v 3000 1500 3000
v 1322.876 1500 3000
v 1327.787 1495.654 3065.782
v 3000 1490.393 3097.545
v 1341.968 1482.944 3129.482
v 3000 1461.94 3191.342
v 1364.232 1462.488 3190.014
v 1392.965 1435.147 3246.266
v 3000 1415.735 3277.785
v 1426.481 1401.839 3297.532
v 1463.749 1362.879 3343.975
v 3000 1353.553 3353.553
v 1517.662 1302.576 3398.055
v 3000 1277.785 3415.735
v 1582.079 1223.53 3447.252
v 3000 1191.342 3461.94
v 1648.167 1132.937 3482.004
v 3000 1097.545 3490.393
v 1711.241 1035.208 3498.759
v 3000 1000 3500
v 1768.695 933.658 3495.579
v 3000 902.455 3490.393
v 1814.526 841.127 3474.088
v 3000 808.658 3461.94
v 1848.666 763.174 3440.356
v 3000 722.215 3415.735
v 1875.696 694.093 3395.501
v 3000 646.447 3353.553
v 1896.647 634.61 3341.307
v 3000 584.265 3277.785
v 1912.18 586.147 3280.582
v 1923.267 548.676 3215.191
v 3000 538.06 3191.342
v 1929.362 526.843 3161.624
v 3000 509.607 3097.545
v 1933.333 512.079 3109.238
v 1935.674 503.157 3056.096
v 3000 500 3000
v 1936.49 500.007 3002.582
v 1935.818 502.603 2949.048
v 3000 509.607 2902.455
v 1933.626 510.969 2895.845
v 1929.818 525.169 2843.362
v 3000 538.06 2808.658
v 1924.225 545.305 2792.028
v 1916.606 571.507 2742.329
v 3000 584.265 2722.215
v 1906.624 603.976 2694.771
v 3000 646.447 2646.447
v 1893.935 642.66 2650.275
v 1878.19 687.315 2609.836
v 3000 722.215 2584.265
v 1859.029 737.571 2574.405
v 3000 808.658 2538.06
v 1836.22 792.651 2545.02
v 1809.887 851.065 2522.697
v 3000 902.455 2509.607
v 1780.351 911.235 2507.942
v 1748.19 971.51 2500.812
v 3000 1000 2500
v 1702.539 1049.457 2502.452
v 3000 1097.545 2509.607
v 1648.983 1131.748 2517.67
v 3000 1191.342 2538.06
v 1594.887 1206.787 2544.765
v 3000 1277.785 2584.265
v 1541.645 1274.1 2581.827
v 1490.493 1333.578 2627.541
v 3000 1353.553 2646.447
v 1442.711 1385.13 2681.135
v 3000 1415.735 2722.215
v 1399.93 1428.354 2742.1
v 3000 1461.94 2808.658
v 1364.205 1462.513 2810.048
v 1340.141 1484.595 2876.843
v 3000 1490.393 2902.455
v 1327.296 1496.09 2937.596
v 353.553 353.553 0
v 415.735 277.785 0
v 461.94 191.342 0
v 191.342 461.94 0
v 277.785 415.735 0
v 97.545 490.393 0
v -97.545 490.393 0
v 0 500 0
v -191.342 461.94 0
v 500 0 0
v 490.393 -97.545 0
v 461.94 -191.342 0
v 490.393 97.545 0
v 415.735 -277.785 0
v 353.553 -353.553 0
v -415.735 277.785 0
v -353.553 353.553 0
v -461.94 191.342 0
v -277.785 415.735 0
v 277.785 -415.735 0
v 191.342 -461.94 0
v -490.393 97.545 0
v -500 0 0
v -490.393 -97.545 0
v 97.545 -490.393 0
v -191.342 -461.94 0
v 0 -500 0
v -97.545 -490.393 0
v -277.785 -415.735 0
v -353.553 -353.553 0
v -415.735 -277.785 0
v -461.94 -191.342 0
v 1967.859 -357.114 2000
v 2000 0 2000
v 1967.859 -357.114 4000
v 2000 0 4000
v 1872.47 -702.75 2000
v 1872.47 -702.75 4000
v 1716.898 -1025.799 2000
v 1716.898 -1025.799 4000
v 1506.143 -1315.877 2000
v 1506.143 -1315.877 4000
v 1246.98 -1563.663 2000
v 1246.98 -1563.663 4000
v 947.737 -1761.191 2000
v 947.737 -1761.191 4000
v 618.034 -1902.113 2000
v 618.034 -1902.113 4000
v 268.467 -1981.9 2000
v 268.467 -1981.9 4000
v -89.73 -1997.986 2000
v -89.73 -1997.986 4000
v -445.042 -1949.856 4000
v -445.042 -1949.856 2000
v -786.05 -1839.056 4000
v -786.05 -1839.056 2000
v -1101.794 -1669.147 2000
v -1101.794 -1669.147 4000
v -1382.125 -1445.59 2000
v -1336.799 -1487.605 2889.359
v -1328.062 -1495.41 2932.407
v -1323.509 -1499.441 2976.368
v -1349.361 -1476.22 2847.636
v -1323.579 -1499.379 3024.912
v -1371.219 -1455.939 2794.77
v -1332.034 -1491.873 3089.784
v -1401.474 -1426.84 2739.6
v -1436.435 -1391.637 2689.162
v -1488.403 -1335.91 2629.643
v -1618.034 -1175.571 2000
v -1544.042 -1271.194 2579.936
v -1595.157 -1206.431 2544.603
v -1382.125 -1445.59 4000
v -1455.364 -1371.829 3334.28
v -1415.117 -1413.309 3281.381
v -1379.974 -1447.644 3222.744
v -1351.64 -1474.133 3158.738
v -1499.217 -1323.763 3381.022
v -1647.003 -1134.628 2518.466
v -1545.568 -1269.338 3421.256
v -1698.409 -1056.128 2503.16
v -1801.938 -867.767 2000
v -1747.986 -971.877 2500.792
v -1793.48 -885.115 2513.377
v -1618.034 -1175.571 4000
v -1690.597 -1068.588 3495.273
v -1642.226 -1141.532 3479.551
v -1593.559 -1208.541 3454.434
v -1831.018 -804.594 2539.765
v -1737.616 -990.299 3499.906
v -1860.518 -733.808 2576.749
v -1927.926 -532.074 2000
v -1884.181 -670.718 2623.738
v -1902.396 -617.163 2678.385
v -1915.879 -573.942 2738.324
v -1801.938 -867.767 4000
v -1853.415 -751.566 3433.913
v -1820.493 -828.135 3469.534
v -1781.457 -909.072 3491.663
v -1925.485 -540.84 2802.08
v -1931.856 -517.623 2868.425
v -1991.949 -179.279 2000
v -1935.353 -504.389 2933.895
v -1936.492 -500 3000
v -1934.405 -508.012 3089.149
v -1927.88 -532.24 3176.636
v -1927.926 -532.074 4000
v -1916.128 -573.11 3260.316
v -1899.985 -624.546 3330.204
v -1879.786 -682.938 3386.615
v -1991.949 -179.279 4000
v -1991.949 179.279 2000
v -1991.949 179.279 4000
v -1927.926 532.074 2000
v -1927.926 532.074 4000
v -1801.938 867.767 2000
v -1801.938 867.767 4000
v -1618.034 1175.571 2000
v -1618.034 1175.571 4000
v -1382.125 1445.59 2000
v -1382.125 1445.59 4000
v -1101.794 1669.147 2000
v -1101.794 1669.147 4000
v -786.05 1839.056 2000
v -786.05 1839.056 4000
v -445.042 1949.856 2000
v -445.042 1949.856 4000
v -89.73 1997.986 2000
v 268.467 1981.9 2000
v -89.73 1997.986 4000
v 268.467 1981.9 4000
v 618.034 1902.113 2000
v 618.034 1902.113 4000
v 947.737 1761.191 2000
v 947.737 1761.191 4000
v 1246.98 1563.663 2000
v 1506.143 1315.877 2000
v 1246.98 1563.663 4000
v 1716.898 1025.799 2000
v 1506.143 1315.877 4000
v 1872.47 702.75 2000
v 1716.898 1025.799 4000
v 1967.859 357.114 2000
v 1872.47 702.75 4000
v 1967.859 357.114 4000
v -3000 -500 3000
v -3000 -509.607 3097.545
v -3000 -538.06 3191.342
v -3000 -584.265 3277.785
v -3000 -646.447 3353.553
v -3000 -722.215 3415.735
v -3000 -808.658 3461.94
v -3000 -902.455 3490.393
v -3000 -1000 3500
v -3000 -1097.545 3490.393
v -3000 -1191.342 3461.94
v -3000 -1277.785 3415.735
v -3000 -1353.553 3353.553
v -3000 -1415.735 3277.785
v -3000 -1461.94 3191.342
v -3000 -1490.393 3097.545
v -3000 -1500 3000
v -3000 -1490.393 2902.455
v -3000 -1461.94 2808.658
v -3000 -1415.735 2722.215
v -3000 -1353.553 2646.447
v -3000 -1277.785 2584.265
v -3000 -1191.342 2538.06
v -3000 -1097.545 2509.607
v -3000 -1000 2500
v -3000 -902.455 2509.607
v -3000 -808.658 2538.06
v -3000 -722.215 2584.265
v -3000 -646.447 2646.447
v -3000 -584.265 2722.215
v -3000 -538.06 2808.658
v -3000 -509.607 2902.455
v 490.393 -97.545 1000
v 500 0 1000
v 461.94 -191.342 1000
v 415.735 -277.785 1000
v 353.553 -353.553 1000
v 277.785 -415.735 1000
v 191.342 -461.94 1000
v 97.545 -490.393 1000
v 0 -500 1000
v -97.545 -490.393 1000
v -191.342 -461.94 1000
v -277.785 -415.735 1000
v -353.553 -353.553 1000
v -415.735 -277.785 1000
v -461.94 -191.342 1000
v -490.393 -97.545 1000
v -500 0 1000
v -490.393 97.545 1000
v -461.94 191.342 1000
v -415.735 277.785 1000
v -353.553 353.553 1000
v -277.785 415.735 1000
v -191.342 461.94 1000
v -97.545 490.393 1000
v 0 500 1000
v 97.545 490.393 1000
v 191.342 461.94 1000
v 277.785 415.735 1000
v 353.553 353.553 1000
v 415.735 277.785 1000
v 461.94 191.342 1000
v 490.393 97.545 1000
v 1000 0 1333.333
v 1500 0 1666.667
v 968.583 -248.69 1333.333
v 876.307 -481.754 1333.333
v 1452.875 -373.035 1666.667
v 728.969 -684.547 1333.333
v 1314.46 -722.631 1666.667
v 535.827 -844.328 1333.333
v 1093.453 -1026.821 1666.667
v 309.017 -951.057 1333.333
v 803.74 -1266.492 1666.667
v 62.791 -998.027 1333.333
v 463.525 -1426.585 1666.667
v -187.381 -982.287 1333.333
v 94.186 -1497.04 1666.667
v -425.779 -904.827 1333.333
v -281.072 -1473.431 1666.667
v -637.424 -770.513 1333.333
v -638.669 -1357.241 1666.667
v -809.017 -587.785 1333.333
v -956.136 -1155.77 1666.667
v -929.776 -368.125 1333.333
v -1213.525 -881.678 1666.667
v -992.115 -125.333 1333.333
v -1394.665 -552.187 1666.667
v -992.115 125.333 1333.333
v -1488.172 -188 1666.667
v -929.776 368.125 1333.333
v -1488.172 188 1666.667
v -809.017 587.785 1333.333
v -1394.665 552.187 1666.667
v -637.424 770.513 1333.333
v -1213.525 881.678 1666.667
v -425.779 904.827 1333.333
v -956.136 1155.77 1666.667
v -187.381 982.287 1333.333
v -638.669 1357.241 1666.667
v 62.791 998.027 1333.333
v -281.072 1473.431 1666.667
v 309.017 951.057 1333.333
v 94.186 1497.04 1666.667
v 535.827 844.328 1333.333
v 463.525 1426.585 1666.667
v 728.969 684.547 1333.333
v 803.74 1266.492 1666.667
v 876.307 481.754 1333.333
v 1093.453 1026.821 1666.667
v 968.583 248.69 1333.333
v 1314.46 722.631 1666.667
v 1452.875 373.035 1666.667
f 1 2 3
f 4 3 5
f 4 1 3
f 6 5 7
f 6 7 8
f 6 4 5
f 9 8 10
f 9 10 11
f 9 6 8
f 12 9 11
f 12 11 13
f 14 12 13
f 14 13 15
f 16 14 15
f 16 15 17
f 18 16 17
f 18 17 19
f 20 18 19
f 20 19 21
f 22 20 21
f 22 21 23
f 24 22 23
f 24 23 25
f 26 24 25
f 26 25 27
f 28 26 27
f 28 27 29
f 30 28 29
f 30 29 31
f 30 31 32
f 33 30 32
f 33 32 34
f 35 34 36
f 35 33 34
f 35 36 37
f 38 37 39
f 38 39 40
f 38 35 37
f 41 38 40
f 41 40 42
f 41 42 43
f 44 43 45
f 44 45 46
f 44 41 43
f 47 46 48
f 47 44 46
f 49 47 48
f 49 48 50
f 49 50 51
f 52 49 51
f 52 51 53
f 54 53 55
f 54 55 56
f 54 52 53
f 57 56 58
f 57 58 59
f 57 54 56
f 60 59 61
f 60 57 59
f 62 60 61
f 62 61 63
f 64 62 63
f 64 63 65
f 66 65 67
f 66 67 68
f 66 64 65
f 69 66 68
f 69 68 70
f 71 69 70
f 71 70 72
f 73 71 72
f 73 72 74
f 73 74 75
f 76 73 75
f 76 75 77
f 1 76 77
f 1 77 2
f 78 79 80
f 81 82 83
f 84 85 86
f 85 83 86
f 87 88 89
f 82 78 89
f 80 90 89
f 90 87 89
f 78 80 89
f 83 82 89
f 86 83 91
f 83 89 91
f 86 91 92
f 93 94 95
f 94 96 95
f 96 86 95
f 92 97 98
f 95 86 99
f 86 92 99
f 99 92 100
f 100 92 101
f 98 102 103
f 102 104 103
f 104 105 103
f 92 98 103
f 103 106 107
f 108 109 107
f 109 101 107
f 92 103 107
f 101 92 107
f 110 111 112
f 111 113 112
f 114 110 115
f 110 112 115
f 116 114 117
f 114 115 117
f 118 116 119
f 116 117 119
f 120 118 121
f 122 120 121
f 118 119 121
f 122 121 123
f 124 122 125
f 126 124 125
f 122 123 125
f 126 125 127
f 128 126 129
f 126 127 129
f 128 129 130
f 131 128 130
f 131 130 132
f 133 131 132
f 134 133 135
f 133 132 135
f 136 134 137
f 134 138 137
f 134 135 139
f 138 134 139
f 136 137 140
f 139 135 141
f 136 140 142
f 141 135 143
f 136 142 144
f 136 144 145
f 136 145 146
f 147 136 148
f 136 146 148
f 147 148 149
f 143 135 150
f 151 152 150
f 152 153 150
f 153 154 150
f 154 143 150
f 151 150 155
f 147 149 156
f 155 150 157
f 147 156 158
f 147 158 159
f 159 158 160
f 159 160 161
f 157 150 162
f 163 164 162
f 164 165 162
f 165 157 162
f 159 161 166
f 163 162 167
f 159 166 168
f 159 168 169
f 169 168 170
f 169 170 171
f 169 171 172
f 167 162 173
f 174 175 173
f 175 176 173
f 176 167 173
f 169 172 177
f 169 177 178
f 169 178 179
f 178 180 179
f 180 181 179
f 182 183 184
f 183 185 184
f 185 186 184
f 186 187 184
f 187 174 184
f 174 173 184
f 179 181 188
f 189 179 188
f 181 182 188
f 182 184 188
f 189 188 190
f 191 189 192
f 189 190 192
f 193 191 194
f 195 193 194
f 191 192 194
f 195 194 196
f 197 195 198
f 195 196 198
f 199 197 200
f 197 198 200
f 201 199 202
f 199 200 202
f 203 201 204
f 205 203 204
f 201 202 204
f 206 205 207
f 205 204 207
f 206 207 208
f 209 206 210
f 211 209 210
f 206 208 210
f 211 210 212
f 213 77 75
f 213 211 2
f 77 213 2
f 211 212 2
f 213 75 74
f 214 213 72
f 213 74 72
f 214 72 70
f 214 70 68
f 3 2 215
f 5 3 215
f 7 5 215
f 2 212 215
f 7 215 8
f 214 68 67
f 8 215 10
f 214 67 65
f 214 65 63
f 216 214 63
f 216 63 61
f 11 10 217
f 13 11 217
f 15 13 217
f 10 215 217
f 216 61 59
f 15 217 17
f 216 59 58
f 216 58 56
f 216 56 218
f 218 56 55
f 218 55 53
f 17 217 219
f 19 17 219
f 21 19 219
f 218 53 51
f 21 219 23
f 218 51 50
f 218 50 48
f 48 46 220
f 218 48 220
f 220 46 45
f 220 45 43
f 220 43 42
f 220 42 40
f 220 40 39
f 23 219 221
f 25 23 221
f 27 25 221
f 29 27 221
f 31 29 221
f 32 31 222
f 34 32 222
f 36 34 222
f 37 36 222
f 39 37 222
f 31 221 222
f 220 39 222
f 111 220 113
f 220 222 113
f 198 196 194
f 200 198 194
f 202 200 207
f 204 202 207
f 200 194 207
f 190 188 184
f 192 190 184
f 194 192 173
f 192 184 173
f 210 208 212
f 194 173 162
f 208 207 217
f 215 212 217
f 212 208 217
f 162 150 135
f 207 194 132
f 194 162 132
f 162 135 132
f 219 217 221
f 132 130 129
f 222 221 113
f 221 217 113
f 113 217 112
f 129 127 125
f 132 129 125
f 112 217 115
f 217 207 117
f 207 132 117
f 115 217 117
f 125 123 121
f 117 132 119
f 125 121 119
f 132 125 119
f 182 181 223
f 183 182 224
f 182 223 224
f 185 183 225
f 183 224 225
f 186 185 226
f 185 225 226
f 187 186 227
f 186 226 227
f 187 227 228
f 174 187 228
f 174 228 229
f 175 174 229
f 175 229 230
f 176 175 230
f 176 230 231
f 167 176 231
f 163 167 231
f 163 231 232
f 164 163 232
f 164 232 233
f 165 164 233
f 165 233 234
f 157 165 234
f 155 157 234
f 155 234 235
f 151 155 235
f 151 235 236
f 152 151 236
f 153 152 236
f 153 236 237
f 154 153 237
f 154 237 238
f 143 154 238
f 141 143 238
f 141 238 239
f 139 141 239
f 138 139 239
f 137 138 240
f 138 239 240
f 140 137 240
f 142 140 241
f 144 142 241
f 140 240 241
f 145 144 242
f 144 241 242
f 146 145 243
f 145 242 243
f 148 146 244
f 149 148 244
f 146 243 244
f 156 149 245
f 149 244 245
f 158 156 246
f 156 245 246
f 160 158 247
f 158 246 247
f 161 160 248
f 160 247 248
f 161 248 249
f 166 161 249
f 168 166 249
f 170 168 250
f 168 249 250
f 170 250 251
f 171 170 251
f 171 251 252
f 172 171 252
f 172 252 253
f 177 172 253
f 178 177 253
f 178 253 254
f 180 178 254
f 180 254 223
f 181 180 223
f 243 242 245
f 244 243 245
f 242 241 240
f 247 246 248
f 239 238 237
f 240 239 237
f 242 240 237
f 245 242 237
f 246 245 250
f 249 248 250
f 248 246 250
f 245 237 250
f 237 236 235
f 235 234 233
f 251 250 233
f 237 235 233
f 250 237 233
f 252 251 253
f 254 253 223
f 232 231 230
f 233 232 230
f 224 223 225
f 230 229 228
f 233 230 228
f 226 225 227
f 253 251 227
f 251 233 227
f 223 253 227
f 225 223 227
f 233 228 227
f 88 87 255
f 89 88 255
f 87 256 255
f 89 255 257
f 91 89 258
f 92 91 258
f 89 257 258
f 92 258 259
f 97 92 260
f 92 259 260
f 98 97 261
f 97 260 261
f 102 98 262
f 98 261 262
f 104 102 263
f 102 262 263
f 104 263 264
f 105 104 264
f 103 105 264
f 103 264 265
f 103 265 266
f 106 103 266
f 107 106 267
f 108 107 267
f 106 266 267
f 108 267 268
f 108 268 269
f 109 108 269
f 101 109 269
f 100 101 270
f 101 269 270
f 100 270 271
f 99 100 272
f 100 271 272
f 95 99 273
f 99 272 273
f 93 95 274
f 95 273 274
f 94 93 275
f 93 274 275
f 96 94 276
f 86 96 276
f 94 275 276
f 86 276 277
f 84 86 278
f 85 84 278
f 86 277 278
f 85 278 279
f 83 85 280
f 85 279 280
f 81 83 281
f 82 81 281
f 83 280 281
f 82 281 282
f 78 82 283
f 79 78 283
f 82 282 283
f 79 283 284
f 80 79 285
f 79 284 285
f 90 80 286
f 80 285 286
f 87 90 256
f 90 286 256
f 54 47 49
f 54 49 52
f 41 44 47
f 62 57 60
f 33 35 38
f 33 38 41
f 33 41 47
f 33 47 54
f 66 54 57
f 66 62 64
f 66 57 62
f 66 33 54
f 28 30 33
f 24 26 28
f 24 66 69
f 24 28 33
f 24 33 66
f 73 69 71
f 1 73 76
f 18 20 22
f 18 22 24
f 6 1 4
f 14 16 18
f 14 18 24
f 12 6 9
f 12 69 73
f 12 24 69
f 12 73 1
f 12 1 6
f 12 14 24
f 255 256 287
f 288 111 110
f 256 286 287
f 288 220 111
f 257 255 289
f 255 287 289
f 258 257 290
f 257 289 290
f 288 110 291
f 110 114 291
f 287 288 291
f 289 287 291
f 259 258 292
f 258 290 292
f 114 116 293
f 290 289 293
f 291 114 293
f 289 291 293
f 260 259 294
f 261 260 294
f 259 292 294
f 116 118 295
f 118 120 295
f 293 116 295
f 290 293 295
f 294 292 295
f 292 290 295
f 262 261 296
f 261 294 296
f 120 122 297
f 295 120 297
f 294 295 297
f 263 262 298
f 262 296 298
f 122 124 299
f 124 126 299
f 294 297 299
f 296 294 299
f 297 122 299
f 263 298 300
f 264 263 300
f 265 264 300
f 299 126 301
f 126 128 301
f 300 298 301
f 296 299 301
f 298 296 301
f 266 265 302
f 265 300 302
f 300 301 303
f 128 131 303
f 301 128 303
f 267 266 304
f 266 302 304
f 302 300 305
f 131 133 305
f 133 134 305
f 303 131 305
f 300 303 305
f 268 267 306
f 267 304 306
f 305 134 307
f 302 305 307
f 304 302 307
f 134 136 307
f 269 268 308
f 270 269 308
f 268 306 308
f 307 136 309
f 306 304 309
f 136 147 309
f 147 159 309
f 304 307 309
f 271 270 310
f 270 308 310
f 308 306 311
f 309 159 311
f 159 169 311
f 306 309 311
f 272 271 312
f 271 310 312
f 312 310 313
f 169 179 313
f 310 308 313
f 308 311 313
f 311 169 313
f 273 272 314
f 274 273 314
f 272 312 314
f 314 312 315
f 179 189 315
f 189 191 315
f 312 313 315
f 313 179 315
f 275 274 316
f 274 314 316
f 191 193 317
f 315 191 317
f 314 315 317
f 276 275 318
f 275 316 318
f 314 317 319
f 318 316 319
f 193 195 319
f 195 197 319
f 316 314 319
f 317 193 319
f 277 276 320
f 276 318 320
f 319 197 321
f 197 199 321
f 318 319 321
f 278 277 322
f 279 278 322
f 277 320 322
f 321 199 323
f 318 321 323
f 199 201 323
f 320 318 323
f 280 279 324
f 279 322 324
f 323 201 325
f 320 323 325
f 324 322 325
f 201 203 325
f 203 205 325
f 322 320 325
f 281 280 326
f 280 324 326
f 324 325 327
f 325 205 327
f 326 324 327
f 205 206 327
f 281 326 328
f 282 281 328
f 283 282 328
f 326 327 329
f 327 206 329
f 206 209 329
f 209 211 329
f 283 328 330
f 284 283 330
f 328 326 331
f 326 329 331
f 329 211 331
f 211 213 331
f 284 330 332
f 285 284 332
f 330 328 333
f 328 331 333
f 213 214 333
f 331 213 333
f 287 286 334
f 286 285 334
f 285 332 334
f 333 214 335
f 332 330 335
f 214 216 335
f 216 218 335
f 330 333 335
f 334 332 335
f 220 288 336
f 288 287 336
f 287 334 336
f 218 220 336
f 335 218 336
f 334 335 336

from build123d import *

# Parameters (mm, degrees)
F3_R = 500
F6_R = 500


with BuildPart() as f1:
    # F0 (on Front) → F1 (revolve)
    with BuildSketch(Plane.XZ):
        Polygon((0, 4000), (0, 0), (500, 0), (500, 1000), (2000, 2000), (2000, 4000), align=None)
    revolve(axis=Axis((0, 0, 2000), (0, 0, -1)))

    # F3 (on offset) → F4 (join, up to the next surface of F1)
    with BuildSketch(Plane.YZ.offset(3000)):
        with Locations((1000, 3000)):
            Circle(F3_R)
    extrude(until=Until.NEXT, dir=(-1, 0, 0))

    # F6 (on offset) → F7 (join, up to the next surface of F1)
    with BuildSketch(Plane.YZ.offset(-3000)):
        with Locations((-1000, 3000)):
            Circle(F6_R)
    extrude(until=Until.NEXT)


solid = f1.part
